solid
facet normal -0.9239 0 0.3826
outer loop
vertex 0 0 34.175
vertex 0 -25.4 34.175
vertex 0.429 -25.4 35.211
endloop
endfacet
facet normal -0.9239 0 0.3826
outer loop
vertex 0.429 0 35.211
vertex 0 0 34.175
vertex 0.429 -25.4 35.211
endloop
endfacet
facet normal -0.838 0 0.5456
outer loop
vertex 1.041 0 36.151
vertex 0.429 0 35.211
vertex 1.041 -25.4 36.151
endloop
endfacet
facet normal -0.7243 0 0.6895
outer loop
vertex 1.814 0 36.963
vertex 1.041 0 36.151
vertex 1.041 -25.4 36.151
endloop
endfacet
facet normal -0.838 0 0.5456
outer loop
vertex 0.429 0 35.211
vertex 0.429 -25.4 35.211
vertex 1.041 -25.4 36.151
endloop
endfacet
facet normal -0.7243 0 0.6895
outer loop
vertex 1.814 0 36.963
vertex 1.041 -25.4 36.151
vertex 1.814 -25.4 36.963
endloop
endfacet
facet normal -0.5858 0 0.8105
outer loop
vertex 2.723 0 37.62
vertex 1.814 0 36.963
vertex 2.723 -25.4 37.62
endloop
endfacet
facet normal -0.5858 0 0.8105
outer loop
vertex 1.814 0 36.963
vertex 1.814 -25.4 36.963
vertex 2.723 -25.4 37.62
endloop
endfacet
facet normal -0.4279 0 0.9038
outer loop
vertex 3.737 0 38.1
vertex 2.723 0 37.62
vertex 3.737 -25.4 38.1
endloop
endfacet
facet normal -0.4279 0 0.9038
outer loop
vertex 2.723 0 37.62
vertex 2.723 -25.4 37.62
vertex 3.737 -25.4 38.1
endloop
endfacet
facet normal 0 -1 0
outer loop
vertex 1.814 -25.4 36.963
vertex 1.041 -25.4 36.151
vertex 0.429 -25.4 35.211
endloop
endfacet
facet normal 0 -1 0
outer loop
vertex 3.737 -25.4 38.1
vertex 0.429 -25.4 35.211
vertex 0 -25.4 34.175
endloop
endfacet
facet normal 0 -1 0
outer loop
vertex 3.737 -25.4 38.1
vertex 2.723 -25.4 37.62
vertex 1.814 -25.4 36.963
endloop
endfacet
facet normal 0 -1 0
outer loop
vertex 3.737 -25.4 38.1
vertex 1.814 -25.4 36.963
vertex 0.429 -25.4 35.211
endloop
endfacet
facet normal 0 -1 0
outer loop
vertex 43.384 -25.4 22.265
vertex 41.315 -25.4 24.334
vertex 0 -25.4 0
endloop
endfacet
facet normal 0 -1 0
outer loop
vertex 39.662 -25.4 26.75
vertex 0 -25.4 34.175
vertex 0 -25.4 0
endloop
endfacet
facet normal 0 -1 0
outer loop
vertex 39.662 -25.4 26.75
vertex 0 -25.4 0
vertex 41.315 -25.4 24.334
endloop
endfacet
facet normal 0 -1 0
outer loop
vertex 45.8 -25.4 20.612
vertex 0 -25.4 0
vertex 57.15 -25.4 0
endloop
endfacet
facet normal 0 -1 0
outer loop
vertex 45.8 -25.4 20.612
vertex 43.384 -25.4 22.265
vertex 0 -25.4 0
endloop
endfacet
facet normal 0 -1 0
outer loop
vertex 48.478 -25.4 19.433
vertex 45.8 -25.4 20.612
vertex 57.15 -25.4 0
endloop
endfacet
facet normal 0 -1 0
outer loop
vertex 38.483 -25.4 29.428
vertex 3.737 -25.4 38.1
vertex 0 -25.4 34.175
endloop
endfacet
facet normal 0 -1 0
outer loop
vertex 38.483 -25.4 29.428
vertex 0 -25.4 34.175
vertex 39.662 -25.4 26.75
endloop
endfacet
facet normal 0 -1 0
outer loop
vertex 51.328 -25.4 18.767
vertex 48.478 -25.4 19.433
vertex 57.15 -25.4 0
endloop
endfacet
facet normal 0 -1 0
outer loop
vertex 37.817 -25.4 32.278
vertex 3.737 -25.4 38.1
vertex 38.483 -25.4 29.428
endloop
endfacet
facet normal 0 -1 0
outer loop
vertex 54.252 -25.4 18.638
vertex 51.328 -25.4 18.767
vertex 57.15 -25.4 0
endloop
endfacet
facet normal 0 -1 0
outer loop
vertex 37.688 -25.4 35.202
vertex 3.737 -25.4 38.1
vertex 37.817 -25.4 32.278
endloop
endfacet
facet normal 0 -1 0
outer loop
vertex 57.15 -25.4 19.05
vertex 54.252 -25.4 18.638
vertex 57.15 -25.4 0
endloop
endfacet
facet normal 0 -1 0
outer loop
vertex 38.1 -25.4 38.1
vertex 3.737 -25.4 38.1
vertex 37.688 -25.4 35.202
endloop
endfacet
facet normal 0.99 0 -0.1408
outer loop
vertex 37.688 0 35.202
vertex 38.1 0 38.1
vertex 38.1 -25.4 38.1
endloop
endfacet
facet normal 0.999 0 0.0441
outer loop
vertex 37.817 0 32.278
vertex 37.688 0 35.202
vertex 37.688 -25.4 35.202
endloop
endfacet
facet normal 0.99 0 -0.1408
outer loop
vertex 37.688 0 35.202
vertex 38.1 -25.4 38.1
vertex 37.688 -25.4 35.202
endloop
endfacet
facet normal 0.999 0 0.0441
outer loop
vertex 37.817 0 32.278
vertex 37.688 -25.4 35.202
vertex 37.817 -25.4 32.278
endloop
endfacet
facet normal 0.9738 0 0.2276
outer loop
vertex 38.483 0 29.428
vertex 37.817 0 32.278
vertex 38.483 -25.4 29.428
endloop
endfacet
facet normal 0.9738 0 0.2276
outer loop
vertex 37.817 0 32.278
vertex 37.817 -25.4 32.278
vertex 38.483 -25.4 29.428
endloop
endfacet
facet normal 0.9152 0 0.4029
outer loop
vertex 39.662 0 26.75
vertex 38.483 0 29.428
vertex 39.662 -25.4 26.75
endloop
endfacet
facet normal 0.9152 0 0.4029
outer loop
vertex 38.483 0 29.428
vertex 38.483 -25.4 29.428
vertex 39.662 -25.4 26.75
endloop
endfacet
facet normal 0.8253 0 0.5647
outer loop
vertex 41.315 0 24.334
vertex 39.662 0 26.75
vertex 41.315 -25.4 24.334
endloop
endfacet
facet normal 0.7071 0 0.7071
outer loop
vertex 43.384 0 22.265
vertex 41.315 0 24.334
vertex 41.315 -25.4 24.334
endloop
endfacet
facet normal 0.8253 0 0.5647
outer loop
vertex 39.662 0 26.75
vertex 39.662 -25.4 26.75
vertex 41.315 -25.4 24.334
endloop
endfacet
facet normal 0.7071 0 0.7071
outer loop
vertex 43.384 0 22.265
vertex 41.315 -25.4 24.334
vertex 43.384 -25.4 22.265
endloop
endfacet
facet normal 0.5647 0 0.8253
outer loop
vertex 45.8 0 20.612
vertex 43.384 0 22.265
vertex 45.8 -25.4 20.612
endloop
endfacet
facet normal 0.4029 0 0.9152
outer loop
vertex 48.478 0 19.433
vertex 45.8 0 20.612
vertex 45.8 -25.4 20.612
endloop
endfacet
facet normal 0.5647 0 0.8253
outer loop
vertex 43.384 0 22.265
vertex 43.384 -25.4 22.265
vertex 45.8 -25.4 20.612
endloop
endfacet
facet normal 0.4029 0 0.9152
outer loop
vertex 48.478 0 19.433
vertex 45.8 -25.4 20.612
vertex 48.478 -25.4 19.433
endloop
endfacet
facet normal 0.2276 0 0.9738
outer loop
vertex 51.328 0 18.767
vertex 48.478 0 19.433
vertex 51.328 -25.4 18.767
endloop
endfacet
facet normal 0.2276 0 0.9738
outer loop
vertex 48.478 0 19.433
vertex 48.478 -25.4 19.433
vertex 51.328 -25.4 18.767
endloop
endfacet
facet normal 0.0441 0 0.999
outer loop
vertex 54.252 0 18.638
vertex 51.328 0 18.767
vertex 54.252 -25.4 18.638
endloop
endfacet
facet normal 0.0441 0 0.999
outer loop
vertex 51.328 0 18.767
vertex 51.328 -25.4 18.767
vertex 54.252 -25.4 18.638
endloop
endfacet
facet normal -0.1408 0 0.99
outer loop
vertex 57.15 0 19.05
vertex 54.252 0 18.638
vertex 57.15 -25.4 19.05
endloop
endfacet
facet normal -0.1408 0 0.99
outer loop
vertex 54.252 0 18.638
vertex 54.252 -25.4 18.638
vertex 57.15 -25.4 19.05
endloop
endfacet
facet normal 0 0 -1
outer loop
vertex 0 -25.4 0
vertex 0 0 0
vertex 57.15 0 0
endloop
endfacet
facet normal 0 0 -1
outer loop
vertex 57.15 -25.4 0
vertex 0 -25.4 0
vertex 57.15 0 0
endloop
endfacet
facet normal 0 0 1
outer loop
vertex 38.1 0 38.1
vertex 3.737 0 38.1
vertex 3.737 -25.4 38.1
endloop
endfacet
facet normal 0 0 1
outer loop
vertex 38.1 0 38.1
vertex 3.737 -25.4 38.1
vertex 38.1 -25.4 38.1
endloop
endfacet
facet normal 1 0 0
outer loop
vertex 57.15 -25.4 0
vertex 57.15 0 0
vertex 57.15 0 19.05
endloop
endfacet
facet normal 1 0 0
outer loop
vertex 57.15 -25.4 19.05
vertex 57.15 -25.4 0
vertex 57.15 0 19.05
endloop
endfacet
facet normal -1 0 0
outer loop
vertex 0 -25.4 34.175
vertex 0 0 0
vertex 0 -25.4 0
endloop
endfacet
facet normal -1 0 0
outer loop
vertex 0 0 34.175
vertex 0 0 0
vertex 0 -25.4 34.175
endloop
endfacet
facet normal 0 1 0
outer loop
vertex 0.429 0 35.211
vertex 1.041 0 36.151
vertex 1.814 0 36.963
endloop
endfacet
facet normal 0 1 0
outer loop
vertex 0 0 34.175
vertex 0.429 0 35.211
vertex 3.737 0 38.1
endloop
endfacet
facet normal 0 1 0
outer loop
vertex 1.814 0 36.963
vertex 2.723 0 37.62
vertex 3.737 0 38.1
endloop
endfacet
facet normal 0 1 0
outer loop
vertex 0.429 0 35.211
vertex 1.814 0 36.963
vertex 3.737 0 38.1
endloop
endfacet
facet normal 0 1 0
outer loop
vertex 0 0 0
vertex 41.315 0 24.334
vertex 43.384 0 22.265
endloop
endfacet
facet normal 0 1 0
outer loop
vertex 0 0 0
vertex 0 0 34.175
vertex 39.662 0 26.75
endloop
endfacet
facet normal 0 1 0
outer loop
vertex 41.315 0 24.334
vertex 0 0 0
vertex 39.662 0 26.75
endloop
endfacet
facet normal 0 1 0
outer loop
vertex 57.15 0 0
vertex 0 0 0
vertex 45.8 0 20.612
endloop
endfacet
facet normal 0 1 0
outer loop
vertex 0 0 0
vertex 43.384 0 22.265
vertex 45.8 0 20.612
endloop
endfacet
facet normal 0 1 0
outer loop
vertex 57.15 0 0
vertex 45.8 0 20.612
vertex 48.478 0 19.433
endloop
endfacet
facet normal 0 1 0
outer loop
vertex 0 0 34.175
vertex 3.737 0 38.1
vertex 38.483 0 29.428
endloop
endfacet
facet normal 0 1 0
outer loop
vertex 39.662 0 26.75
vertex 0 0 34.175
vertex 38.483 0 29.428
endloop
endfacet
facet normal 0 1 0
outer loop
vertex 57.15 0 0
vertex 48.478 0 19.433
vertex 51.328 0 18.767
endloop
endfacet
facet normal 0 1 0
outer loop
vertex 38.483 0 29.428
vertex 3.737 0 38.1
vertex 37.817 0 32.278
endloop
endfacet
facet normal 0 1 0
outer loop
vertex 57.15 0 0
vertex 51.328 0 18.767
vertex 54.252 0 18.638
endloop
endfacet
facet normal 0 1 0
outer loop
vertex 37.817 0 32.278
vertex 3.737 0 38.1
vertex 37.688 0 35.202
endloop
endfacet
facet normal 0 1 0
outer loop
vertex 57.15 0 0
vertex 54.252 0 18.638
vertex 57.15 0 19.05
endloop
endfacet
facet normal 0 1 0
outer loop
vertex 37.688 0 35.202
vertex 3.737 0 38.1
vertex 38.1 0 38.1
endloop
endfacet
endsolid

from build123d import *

# Parameters (mm, degrees)
F0_W     = 57.15
F0_H     = 38.1
F1_DEPTH = 25.4
F3_DEPTH = 25.4
F5_DEPTH = 25.4


with BuildPart() as f1:
    # F0 (on Front) → F1 (new body)
    with BuildSketch(Plane.XZ):
        with Locations((28.575, 19.05)):
            Rectangle(F0_W, F0_H)
    extrude(amount=F1_DEPTH)

    # F2 (on face) → F3 (cut)
    with BuildSketch(Plane.XZ.offset(25.4)):
        with BuildLine():
            Line((57.15, 38.1), (38.1, 38.1))
            ThreePointArc((38.1, 38.1), (42.301432, 23.251432), (57.15, 19.05))
            Line((57.15, 19.05), (57.15, 38.1))
        make_face()
    extrude(amount=-F3_DEPTH, mode=Mode.SUBTRACT)

    # F4 (on face) → F5 (cut)
    with BuildSketch(Plane.XZ.offset(25.4)):
        with BuildLine():
            Line((0, 38.1), (0, 34.175124))
            ThreePointArc((0, 34.175124), (1.409017, 36.575001), (3.736917, 38.1))
            Line((3.736917, 38.1), (0, 38.1))
        make_face()
    extrude(amount=-F5_DEPTH, mode=Mode.SUBTRACT)


solid = f1.part
